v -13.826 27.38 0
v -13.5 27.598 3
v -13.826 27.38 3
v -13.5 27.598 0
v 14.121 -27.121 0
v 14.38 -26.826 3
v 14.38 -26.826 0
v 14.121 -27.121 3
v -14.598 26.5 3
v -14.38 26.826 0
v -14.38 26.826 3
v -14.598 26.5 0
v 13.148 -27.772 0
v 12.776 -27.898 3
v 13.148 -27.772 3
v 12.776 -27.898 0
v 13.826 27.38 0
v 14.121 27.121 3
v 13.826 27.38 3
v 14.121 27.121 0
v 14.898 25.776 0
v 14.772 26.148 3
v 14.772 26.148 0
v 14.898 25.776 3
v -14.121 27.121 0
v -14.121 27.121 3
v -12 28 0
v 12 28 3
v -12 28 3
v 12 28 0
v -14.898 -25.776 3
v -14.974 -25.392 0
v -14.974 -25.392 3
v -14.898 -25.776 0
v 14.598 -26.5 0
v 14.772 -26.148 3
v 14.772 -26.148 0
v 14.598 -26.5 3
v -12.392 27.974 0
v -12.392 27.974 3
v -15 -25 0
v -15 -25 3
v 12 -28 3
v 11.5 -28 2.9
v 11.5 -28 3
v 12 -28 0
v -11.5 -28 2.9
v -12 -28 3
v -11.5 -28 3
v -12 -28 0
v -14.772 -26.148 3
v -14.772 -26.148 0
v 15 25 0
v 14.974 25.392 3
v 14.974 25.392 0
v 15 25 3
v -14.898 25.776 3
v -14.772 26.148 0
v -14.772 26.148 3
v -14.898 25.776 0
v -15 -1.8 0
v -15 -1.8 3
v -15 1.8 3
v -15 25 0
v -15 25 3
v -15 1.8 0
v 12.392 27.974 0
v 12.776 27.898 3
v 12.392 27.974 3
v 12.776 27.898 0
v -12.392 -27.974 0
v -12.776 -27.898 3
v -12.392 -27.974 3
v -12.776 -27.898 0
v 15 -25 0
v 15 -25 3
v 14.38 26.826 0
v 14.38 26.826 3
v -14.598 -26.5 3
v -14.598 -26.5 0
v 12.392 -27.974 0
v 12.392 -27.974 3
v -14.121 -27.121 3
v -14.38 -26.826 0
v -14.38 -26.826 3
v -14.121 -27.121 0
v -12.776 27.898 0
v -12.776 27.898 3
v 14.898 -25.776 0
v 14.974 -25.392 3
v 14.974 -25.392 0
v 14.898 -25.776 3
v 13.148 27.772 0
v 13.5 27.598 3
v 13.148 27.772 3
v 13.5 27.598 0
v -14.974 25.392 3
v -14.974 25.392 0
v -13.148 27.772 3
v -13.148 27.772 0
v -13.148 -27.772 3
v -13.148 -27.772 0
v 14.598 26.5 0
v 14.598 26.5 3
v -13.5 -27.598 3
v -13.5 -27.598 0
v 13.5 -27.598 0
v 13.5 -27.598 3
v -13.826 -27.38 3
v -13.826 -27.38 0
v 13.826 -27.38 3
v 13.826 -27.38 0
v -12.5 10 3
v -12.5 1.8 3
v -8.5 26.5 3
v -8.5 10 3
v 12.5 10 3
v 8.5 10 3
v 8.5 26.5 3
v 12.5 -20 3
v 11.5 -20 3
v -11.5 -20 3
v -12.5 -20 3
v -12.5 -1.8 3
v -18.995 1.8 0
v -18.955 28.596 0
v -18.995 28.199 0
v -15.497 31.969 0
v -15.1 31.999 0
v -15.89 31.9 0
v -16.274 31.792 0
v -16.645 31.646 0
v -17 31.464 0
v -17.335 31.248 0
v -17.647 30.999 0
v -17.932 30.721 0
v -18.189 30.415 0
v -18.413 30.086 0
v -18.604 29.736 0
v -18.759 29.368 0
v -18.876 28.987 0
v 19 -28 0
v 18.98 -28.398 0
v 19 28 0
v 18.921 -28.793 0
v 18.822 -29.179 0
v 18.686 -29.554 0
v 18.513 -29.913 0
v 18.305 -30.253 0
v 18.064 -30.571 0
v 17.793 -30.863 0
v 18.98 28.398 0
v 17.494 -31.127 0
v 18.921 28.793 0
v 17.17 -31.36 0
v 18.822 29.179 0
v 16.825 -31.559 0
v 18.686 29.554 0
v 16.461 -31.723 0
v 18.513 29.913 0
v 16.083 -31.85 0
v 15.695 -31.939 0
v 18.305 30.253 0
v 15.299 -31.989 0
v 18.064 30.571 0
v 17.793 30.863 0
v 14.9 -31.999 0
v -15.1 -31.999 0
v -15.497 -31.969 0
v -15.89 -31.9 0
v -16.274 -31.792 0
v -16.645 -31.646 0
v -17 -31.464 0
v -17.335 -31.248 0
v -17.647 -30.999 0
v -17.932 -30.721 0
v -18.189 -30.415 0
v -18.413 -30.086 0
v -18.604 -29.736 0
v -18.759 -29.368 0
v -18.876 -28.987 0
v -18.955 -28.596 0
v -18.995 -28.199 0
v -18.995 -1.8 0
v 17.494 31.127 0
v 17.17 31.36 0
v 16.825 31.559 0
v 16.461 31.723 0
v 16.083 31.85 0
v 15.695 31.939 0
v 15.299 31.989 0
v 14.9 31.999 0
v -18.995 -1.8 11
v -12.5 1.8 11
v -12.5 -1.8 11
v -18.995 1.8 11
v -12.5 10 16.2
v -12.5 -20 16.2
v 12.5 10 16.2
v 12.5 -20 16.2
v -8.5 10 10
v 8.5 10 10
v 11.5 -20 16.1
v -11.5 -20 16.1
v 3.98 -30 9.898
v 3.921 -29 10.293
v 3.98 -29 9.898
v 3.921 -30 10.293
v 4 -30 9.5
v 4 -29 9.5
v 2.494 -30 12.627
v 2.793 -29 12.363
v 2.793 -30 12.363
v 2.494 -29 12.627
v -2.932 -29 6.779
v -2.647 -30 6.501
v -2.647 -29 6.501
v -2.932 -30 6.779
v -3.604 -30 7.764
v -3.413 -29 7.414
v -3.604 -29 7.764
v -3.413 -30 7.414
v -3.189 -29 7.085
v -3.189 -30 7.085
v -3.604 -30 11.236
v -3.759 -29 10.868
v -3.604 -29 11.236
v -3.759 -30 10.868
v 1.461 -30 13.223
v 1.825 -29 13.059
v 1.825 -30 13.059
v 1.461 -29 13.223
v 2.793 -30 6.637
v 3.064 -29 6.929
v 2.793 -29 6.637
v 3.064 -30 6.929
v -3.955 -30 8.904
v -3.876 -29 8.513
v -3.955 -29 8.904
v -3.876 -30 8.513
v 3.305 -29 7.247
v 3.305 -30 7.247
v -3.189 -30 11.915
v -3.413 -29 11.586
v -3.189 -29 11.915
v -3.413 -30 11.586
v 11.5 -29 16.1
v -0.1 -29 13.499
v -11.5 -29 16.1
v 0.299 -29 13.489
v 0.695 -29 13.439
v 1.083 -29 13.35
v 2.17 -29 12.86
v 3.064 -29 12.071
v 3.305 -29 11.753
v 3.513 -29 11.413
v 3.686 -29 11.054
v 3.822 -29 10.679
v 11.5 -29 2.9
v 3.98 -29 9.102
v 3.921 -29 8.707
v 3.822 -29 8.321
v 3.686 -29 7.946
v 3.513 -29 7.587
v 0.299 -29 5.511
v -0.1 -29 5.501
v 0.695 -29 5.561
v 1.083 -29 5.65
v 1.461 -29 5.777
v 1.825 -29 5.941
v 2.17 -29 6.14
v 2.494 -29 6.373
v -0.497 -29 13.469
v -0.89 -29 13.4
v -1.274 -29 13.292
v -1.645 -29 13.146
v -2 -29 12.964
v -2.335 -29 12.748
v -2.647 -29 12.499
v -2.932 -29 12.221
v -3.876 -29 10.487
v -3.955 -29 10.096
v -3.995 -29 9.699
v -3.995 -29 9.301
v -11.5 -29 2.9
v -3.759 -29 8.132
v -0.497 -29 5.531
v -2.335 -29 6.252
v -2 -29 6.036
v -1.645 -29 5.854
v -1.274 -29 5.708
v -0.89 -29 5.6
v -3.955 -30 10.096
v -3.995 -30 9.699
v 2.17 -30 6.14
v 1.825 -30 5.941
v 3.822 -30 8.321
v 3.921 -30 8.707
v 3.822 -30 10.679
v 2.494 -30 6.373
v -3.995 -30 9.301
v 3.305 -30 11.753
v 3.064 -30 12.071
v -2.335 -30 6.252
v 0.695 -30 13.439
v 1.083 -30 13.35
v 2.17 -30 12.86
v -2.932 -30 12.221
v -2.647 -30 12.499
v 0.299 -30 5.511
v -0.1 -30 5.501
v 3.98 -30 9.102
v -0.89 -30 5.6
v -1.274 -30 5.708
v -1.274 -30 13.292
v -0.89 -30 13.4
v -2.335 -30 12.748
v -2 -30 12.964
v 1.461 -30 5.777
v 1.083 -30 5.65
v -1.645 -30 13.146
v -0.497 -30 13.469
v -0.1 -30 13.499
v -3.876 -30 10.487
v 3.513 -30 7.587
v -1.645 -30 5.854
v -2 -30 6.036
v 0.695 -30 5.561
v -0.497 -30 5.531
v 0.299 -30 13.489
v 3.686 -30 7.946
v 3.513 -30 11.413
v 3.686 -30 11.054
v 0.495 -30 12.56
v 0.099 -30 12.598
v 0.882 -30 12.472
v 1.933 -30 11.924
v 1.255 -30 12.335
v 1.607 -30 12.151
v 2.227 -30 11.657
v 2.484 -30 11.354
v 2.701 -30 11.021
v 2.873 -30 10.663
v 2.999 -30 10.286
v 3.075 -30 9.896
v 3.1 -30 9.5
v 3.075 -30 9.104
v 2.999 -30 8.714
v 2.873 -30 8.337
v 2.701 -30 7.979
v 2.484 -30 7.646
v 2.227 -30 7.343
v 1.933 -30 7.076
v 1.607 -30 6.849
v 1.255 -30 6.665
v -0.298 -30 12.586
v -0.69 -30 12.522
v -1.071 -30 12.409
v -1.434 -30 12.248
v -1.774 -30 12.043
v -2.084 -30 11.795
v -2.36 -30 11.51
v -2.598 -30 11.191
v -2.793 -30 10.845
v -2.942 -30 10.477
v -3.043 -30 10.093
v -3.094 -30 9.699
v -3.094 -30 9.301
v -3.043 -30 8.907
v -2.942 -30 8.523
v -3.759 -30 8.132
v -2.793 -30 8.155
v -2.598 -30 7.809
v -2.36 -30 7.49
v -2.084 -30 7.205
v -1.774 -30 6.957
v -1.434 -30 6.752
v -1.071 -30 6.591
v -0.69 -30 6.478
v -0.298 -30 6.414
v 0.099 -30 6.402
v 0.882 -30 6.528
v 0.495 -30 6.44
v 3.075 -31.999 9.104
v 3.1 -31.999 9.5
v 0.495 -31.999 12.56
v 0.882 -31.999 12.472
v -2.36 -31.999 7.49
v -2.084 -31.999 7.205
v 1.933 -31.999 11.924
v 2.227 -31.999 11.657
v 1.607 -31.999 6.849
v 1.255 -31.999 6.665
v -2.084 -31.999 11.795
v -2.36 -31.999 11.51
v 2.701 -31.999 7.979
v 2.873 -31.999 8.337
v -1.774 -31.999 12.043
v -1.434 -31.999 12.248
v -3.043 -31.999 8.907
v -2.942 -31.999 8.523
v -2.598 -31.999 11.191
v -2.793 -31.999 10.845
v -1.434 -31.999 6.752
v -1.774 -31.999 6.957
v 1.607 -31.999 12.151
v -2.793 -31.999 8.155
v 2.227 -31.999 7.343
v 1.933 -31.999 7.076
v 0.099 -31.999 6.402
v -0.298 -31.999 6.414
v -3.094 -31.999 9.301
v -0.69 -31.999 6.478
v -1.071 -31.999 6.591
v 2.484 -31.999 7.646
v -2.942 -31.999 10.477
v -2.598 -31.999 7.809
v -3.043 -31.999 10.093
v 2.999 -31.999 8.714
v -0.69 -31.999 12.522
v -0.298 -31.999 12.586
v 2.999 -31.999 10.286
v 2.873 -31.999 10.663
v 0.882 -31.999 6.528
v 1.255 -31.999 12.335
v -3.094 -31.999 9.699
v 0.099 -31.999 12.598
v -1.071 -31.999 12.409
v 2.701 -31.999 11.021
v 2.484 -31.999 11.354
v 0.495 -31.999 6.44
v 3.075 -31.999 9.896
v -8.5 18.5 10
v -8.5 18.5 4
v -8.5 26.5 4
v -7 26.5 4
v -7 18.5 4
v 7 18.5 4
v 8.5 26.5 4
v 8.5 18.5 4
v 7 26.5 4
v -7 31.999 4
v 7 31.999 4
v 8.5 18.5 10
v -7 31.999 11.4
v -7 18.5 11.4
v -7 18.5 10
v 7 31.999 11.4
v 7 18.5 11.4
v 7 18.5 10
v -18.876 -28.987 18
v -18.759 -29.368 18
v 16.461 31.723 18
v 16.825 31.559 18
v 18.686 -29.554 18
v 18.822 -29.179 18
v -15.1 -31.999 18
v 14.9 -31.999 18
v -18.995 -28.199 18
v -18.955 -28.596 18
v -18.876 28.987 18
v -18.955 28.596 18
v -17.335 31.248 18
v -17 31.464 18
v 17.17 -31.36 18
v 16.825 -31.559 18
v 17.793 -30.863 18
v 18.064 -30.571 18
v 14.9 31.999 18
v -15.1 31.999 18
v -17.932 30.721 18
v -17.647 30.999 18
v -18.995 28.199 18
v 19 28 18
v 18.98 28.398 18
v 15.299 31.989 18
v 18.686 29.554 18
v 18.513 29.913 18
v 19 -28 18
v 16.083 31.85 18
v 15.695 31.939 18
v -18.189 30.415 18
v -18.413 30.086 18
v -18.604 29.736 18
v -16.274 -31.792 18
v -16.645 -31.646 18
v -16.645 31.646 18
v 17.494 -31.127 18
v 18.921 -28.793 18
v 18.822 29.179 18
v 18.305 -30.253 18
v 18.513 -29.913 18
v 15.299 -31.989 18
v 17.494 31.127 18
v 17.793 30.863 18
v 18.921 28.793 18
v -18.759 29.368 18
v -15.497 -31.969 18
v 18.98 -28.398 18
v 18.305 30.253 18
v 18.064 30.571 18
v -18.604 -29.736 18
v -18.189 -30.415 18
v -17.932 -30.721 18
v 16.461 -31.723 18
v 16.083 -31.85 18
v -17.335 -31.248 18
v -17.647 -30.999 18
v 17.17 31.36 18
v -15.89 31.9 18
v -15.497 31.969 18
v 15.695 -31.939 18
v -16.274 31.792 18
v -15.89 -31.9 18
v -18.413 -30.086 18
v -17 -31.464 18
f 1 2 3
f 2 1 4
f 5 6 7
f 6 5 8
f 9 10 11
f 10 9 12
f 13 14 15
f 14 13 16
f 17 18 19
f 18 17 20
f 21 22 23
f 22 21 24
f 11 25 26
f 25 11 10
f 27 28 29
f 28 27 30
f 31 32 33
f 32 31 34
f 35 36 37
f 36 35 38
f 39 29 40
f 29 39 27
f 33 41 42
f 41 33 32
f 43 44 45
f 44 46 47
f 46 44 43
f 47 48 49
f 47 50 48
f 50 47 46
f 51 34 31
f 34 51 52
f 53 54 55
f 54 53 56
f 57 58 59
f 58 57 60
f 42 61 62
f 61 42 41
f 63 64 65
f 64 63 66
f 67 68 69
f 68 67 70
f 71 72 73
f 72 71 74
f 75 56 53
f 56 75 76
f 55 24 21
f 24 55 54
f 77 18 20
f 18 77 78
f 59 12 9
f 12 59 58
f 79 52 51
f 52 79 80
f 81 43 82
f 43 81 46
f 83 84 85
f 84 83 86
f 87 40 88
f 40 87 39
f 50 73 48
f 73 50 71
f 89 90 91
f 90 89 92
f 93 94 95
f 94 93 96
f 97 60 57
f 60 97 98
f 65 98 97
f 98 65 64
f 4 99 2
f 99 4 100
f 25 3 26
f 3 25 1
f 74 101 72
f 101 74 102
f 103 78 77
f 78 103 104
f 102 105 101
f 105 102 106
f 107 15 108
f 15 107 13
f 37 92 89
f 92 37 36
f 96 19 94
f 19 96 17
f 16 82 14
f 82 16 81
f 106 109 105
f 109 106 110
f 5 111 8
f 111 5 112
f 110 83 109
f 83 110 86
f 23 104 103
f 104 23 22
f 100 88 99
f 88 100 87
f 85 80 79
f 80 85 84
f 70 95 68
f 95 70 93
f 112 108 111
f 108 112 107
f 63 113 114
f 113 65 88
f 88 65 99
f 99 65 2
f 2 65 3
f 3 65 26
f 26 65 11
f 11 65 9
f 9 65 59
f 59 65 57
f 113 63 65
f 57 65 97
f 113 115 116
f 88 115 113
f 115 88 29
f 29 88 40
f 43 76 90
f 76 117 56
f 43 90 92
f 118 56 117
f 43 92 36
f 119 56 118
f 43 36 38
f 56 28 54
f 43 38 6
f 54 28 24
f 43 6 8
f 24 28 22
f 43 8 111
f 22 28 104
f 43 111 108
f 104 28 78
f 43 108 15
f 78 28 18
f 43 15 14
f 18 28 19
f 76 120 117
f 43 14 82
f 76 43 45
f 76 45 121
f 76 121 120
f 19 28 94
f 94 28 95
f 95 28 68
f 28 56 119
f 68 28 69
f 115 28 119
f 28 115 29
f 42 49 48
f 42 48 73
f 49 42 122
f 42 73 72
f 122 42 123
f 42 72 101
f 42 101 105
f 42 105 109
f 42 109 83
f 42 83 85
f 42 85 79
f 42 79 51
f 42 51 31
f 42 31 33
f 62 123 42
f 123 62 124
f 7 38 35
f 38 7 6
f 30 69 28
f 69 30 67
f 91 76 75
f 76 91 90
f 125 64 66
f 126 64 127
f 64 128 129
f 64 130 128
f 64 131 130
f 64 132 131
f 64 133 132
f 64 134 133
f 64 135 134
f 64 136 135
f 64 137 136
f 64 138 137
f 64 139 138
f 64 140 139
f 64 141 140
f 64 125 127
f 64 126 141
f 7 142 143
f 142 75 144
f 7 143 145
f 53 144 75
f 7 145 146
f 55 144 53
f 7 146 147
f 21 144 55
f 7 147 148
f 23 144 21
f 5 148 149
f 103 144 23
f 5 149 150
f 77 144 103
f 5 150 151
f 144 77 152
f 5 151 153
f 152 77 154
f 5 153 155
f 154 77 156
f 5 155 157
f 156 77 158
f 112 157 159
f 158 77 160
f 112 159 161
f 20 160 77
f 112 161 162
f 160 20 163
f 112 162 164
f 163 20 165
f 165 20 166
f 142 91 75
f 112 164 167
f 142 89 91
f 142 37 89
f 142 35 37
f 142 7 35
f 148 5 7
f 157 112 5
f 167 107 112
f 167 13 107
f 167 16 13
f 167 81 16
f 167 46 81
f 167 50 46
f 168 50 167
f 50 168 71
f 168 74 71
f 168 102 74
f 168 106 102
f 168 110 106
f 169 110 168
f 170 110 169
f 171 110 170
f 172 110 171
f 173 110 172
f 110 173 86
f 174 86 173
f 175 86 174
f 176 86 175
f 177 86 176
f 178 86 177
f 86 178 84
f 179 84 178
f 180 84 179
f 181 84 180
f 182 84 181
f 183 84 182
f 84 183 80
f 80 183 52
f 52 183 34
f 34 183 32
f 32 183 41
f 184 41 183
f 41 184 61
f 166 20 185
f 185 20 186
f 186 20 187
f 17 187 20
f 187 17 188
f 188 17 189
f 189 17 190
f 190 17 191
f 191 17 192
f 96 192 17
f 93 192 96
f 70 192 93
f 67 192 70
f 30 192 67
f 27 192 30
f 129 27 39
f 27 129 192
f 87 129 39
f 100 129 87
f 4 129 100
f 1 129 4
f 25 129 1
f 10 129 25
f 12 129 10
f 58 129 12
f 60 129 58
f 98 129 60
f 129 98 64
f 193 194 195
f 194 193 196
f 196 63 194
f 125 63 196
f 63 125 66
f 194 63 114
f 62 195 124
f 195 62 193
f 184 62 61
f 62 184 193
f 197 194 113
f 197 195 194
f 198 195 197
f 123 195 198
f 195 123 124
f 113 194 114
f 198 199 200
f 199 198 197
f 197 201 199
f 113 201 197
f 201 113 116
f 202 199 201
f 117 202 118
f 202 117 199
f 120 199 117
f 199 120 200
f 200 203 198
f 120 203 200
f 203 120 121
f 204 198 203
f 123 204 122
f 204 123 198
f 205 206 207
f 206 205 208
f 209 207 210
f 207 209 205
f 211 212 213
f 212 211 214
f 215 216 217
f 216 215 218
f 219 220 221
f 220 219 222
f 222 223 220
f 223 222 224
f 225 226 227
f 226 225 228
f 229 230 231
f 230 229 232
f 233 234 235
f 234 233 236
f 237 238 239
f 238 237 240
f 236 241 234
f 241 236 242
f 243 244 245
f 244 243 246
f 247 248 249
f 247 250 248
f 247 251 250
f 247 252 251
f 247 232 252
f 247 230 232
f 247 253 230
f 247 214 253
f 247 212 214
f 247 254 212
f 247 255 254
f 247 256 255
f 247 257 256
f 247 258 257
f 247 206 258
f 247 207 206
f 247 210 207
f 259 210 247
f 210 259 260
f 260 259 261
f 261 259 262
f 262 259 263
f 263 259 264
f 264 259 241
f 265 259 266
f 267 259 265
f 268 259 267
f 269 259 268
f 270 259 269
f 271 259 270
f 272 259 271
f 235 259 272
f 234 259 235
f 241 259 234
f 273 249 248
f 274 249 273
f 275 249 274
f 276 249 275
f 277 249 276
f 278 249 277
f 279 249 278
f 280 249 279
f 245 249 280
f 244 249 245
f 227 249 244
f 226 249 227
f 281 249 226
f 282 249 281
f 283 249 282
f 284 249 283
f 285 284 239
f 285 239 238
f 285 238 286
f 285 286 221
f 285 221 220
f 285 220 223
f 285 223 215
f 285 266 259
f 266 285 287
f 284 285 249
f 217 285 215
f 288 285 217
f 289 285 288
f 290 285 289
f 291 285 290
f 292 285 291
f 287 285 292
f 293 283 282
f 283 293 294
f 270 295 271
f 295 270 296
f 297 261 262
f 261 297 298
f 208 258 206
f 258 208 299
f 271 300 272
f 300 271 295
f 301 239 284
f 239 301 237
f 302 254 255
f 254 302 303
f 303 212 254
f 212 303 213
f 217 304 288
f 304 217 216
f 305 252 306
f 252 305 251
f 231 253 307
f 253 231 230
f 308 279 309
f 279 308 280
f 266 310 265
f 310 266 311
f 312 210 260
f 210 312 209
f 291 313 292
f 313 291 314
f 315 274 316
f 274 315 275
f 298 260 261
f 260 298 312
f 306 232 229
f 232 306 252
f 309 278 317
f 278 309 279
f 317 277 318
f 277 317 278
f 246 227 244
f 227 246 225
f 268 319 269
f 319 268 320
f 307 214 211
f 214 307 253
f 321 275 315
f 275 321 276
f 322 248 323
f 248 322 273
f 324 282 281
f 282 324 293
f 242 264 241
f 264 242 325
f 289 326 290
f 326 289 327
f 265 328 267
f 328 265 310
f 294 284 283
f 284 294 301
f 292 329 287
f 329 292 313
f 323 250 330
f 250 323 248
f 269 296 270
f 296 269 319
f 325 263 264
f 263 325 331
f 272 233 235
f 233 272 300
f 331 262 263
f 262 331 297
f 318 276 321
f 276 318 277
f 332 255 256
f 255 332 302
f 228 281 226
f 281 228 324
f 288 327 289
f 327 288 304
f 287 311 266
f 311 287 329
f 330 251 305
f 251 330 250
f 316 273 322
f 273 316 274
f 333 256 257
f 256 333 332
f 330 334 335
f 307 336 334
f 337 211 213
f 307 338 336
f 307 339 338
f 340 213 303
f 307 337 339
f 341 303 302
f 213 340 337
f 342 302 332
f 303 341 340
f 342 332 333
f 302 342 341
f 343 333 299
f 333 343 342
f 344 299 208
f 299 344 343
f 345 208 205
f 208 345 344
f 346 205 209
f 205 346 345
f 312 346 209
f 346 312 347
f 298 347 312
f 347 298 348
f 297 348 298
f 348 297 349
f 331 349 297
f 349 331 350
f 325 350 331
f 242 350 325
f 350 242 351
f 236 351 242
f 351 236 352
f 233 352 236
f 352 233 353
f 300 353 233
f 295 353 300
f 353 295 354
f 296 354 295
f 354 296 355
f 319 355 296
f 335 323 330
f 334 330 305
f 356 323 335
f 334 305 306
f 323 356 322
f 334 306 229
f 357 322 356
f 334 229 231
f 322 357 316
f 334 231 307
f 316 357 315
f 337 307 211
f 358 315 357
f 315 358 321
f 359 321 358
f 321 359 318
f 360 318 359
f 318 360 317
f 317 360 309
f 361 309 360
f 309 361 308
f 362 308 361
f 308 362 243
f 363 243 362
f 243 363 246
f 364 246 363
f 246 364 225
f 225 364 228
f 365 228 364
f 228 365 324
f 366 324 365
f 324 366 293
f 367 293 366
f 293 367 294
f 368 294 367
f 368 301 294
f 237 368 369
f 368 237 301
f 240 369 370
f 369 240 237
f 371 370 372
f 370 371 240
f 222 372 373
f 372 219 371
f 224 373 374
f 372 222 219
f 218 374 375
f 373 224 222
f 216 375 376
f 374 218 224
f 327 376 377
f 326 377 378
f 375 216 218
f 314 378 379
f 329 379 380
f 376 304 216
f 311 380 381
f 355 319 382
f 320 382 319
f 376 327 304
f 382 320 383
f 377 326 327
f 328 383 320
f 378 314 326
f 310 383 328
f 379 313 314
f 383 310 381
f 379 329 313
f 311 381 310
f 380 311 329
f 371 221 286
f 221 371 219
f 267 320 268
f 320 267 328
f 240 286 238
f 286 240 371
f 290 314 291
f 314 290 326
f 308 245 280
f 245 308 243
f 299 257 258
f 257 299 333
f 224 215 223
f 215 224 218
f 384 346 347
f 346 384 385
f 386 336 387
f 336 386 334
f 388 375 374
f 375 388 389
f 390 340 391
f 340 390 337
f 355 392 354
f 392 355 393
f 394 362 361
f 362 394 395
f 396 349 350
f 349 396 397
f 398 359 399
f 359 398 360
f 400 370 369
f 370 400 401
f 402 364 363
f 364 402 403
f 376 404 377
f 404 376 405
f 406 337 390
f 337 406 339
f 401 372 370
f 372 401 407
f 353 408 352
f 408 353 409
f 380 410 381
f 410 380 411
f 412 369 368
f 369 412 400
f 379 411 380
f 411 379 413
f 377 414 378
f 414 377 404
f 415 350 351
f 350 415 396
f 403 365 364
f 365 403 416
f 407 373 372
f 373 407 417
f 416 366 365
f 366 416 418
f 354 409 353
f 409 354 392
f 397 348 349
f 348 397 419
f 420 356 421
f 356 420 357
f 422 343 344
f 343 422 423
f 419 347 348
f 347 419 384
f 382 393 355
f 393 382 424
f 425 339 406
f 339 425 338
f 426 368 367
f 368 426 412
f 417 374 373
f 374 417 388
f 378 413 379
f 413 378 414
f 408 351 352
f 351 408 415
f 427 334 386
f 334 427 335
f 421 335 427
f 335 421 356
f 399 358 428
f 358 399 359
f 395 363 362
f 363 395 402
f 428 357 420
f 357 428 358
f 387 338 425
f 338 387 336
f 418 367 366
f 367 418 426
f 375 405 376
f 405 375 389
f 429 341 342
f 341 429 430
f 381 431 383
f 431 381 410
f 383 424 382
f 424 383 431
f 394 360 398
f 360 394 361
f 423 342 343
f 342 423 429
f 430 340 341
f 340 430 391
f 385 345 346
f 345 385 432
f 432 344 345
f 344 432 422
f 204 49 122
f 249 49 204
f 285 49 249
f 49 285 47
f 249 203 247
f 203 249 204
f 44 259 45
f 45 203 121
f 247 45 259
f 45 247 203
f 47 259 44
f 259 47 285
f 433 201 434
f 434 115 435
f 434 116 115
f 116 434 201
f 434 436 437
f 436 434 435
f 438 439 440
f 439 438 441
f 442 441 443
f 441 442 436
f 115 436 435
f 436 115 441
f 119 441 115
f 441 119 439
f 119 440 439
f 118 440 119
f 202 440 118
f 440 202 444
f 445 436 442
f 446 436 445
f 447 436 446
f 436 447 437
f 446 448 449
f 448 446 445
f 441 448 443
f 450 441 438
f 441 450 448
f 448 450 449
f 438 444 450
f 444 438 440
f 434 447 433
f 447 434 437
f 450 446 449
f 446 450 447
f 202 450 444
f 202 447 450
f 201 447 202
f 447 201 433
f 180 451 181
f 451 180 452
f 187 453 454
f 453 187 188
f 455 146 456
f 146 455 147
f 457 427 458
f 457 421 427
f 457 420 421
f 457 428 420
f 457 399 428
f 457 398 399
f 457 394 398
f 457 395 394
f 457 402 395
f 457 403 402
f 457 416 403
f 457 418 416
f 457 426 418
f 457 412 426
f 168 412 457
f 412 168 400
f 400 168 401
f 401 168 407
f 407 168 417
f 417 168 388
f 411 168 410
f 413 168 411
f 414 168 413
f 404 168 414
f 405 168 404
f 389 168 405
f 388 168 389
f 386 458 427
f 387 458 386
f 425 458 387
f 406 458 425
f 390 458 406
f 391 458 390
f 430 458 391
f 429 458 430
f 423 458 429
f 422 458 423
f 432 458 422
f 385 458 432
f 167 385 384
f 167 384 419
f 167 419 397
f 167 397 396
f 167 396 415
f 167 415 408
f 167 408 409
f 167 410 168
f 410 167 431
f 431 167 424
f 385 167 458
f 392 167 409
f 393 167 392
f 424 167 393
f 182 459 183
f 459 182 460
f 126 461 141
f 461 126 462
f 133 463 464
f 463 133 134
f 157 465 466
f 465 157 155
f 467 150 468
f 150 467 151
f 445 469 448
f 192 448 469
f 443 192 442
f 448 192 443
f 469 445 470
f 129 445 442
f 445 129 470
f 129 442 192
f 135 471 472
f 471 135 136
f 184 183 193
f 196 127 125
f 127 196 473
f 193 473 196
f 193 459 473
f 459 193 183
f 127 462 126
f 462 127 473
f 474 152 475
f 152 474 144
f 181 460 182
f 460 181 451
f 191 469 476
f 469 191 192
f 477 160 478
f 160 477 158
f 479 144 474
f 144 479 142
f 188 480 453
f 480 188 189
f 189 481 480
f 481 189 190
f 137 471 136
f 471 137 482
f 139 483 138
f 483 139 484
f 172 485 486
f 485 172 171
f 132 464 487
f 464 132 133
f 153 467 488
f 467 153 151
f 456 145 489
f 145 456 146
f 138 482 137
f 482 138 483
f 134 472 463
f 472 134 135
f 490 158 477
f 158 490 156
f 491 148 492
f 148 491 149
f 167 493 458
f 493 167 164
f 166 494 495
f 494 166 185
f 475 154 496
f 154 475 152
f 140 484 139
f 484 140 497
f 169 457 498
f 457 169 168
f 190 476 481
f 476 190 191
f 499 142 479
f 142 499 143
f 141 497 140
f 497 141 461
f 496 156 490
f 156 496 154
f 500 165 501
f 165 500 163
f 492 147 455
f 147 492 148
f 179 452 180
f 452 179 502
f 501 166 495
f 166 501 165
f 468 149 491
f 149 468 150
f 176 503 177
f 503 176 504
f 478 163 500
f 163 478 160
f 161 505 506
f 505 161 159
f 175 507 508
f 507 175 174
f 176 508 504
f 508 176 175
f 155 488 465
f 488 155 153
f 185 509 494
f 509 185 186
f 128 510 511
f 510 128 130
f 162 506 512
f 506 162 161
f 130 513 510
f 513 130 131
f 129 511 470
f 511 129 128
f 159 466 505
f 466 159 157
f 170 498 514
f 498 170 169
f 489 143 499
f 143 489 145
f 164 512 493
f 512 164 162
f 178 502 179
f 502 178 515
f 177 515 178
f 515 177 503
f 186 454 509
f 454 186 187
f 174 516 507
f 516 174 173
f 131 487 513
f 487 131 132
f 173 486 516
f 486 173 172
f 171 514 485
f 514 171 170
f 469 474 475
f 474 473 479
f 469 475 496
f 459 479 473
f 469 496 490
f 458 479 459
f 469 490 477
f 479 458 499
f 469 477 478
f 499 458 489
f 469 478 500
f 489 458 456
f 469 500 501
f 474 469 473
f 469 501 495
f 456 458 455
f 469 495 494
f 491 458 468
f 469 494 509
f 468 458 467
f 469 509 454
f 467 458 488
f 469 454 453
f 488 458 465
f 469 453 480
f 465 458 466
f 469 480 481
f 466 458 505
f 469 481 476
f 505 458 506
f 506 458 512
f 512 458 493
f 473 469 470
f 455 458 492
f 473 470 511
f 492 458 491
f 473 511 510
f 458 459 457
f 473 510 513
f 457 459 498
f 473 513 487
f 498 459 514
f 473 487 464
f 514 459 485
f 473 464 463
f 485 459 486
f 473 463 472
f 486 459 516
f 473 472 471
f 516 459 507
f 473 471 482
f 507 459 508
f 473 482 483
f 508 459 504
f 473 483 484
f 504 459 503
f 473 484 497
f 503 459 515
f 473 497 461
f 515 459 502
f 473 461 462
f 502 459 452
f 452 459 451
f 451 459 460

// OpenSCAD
//$fn=60;
$fa=5;
$fs=.4;


difference(){
    body();
    center_cut();
    translate([0,-29,3+6.5]) rotate([90,0,0]) switch();
    translate([0,32-14,4]) usb_con();
}


module switch(){
    linear_extrude(height=1) circle(d=8);
    linear_extrude(height=9) circle(d=6.2);
    translate([0,0,-11]) linear_extrude(height=11) square([23,13.2],center=true);
}

module usb_con(){
    translate([0,0,-1.5]) linear_extrude(height=1.5) square([17,17],center=true);
    translate([0,7.5,0]) linear_extrude(height=7.4) square([14,23-9],center=true);
    translate([0,-4,0]) linear_extrude(height=6) square([17,9],center=true);
}
   
module body(){
    linear_extrude(height=18) hull(){
        translate([-15,28,0]) circle(d=8);
        translate([15,28,0]) circle(d=8);
        translate([-15,-28,0]) circle(d=8);
        translate([15,-28,0]) circle(d=8);
    }
}

module center_cut(){
    linear_extrude(height=3) hull(){
        translate([-12,25,0]) circle(d=6);
        translate([12,25,0]) circle(d=6);
        translate([-12,-25,0]) circle(d=6);
        translate([12,-25,0]) circle(d=6);
    }
    translate([-10,0,0]) linear_extrude(height=11) square([20,3.6],center=true);
    translate([0,-5,0]) linear_extrude(height=16.2) square([25,30],center=true);
}
